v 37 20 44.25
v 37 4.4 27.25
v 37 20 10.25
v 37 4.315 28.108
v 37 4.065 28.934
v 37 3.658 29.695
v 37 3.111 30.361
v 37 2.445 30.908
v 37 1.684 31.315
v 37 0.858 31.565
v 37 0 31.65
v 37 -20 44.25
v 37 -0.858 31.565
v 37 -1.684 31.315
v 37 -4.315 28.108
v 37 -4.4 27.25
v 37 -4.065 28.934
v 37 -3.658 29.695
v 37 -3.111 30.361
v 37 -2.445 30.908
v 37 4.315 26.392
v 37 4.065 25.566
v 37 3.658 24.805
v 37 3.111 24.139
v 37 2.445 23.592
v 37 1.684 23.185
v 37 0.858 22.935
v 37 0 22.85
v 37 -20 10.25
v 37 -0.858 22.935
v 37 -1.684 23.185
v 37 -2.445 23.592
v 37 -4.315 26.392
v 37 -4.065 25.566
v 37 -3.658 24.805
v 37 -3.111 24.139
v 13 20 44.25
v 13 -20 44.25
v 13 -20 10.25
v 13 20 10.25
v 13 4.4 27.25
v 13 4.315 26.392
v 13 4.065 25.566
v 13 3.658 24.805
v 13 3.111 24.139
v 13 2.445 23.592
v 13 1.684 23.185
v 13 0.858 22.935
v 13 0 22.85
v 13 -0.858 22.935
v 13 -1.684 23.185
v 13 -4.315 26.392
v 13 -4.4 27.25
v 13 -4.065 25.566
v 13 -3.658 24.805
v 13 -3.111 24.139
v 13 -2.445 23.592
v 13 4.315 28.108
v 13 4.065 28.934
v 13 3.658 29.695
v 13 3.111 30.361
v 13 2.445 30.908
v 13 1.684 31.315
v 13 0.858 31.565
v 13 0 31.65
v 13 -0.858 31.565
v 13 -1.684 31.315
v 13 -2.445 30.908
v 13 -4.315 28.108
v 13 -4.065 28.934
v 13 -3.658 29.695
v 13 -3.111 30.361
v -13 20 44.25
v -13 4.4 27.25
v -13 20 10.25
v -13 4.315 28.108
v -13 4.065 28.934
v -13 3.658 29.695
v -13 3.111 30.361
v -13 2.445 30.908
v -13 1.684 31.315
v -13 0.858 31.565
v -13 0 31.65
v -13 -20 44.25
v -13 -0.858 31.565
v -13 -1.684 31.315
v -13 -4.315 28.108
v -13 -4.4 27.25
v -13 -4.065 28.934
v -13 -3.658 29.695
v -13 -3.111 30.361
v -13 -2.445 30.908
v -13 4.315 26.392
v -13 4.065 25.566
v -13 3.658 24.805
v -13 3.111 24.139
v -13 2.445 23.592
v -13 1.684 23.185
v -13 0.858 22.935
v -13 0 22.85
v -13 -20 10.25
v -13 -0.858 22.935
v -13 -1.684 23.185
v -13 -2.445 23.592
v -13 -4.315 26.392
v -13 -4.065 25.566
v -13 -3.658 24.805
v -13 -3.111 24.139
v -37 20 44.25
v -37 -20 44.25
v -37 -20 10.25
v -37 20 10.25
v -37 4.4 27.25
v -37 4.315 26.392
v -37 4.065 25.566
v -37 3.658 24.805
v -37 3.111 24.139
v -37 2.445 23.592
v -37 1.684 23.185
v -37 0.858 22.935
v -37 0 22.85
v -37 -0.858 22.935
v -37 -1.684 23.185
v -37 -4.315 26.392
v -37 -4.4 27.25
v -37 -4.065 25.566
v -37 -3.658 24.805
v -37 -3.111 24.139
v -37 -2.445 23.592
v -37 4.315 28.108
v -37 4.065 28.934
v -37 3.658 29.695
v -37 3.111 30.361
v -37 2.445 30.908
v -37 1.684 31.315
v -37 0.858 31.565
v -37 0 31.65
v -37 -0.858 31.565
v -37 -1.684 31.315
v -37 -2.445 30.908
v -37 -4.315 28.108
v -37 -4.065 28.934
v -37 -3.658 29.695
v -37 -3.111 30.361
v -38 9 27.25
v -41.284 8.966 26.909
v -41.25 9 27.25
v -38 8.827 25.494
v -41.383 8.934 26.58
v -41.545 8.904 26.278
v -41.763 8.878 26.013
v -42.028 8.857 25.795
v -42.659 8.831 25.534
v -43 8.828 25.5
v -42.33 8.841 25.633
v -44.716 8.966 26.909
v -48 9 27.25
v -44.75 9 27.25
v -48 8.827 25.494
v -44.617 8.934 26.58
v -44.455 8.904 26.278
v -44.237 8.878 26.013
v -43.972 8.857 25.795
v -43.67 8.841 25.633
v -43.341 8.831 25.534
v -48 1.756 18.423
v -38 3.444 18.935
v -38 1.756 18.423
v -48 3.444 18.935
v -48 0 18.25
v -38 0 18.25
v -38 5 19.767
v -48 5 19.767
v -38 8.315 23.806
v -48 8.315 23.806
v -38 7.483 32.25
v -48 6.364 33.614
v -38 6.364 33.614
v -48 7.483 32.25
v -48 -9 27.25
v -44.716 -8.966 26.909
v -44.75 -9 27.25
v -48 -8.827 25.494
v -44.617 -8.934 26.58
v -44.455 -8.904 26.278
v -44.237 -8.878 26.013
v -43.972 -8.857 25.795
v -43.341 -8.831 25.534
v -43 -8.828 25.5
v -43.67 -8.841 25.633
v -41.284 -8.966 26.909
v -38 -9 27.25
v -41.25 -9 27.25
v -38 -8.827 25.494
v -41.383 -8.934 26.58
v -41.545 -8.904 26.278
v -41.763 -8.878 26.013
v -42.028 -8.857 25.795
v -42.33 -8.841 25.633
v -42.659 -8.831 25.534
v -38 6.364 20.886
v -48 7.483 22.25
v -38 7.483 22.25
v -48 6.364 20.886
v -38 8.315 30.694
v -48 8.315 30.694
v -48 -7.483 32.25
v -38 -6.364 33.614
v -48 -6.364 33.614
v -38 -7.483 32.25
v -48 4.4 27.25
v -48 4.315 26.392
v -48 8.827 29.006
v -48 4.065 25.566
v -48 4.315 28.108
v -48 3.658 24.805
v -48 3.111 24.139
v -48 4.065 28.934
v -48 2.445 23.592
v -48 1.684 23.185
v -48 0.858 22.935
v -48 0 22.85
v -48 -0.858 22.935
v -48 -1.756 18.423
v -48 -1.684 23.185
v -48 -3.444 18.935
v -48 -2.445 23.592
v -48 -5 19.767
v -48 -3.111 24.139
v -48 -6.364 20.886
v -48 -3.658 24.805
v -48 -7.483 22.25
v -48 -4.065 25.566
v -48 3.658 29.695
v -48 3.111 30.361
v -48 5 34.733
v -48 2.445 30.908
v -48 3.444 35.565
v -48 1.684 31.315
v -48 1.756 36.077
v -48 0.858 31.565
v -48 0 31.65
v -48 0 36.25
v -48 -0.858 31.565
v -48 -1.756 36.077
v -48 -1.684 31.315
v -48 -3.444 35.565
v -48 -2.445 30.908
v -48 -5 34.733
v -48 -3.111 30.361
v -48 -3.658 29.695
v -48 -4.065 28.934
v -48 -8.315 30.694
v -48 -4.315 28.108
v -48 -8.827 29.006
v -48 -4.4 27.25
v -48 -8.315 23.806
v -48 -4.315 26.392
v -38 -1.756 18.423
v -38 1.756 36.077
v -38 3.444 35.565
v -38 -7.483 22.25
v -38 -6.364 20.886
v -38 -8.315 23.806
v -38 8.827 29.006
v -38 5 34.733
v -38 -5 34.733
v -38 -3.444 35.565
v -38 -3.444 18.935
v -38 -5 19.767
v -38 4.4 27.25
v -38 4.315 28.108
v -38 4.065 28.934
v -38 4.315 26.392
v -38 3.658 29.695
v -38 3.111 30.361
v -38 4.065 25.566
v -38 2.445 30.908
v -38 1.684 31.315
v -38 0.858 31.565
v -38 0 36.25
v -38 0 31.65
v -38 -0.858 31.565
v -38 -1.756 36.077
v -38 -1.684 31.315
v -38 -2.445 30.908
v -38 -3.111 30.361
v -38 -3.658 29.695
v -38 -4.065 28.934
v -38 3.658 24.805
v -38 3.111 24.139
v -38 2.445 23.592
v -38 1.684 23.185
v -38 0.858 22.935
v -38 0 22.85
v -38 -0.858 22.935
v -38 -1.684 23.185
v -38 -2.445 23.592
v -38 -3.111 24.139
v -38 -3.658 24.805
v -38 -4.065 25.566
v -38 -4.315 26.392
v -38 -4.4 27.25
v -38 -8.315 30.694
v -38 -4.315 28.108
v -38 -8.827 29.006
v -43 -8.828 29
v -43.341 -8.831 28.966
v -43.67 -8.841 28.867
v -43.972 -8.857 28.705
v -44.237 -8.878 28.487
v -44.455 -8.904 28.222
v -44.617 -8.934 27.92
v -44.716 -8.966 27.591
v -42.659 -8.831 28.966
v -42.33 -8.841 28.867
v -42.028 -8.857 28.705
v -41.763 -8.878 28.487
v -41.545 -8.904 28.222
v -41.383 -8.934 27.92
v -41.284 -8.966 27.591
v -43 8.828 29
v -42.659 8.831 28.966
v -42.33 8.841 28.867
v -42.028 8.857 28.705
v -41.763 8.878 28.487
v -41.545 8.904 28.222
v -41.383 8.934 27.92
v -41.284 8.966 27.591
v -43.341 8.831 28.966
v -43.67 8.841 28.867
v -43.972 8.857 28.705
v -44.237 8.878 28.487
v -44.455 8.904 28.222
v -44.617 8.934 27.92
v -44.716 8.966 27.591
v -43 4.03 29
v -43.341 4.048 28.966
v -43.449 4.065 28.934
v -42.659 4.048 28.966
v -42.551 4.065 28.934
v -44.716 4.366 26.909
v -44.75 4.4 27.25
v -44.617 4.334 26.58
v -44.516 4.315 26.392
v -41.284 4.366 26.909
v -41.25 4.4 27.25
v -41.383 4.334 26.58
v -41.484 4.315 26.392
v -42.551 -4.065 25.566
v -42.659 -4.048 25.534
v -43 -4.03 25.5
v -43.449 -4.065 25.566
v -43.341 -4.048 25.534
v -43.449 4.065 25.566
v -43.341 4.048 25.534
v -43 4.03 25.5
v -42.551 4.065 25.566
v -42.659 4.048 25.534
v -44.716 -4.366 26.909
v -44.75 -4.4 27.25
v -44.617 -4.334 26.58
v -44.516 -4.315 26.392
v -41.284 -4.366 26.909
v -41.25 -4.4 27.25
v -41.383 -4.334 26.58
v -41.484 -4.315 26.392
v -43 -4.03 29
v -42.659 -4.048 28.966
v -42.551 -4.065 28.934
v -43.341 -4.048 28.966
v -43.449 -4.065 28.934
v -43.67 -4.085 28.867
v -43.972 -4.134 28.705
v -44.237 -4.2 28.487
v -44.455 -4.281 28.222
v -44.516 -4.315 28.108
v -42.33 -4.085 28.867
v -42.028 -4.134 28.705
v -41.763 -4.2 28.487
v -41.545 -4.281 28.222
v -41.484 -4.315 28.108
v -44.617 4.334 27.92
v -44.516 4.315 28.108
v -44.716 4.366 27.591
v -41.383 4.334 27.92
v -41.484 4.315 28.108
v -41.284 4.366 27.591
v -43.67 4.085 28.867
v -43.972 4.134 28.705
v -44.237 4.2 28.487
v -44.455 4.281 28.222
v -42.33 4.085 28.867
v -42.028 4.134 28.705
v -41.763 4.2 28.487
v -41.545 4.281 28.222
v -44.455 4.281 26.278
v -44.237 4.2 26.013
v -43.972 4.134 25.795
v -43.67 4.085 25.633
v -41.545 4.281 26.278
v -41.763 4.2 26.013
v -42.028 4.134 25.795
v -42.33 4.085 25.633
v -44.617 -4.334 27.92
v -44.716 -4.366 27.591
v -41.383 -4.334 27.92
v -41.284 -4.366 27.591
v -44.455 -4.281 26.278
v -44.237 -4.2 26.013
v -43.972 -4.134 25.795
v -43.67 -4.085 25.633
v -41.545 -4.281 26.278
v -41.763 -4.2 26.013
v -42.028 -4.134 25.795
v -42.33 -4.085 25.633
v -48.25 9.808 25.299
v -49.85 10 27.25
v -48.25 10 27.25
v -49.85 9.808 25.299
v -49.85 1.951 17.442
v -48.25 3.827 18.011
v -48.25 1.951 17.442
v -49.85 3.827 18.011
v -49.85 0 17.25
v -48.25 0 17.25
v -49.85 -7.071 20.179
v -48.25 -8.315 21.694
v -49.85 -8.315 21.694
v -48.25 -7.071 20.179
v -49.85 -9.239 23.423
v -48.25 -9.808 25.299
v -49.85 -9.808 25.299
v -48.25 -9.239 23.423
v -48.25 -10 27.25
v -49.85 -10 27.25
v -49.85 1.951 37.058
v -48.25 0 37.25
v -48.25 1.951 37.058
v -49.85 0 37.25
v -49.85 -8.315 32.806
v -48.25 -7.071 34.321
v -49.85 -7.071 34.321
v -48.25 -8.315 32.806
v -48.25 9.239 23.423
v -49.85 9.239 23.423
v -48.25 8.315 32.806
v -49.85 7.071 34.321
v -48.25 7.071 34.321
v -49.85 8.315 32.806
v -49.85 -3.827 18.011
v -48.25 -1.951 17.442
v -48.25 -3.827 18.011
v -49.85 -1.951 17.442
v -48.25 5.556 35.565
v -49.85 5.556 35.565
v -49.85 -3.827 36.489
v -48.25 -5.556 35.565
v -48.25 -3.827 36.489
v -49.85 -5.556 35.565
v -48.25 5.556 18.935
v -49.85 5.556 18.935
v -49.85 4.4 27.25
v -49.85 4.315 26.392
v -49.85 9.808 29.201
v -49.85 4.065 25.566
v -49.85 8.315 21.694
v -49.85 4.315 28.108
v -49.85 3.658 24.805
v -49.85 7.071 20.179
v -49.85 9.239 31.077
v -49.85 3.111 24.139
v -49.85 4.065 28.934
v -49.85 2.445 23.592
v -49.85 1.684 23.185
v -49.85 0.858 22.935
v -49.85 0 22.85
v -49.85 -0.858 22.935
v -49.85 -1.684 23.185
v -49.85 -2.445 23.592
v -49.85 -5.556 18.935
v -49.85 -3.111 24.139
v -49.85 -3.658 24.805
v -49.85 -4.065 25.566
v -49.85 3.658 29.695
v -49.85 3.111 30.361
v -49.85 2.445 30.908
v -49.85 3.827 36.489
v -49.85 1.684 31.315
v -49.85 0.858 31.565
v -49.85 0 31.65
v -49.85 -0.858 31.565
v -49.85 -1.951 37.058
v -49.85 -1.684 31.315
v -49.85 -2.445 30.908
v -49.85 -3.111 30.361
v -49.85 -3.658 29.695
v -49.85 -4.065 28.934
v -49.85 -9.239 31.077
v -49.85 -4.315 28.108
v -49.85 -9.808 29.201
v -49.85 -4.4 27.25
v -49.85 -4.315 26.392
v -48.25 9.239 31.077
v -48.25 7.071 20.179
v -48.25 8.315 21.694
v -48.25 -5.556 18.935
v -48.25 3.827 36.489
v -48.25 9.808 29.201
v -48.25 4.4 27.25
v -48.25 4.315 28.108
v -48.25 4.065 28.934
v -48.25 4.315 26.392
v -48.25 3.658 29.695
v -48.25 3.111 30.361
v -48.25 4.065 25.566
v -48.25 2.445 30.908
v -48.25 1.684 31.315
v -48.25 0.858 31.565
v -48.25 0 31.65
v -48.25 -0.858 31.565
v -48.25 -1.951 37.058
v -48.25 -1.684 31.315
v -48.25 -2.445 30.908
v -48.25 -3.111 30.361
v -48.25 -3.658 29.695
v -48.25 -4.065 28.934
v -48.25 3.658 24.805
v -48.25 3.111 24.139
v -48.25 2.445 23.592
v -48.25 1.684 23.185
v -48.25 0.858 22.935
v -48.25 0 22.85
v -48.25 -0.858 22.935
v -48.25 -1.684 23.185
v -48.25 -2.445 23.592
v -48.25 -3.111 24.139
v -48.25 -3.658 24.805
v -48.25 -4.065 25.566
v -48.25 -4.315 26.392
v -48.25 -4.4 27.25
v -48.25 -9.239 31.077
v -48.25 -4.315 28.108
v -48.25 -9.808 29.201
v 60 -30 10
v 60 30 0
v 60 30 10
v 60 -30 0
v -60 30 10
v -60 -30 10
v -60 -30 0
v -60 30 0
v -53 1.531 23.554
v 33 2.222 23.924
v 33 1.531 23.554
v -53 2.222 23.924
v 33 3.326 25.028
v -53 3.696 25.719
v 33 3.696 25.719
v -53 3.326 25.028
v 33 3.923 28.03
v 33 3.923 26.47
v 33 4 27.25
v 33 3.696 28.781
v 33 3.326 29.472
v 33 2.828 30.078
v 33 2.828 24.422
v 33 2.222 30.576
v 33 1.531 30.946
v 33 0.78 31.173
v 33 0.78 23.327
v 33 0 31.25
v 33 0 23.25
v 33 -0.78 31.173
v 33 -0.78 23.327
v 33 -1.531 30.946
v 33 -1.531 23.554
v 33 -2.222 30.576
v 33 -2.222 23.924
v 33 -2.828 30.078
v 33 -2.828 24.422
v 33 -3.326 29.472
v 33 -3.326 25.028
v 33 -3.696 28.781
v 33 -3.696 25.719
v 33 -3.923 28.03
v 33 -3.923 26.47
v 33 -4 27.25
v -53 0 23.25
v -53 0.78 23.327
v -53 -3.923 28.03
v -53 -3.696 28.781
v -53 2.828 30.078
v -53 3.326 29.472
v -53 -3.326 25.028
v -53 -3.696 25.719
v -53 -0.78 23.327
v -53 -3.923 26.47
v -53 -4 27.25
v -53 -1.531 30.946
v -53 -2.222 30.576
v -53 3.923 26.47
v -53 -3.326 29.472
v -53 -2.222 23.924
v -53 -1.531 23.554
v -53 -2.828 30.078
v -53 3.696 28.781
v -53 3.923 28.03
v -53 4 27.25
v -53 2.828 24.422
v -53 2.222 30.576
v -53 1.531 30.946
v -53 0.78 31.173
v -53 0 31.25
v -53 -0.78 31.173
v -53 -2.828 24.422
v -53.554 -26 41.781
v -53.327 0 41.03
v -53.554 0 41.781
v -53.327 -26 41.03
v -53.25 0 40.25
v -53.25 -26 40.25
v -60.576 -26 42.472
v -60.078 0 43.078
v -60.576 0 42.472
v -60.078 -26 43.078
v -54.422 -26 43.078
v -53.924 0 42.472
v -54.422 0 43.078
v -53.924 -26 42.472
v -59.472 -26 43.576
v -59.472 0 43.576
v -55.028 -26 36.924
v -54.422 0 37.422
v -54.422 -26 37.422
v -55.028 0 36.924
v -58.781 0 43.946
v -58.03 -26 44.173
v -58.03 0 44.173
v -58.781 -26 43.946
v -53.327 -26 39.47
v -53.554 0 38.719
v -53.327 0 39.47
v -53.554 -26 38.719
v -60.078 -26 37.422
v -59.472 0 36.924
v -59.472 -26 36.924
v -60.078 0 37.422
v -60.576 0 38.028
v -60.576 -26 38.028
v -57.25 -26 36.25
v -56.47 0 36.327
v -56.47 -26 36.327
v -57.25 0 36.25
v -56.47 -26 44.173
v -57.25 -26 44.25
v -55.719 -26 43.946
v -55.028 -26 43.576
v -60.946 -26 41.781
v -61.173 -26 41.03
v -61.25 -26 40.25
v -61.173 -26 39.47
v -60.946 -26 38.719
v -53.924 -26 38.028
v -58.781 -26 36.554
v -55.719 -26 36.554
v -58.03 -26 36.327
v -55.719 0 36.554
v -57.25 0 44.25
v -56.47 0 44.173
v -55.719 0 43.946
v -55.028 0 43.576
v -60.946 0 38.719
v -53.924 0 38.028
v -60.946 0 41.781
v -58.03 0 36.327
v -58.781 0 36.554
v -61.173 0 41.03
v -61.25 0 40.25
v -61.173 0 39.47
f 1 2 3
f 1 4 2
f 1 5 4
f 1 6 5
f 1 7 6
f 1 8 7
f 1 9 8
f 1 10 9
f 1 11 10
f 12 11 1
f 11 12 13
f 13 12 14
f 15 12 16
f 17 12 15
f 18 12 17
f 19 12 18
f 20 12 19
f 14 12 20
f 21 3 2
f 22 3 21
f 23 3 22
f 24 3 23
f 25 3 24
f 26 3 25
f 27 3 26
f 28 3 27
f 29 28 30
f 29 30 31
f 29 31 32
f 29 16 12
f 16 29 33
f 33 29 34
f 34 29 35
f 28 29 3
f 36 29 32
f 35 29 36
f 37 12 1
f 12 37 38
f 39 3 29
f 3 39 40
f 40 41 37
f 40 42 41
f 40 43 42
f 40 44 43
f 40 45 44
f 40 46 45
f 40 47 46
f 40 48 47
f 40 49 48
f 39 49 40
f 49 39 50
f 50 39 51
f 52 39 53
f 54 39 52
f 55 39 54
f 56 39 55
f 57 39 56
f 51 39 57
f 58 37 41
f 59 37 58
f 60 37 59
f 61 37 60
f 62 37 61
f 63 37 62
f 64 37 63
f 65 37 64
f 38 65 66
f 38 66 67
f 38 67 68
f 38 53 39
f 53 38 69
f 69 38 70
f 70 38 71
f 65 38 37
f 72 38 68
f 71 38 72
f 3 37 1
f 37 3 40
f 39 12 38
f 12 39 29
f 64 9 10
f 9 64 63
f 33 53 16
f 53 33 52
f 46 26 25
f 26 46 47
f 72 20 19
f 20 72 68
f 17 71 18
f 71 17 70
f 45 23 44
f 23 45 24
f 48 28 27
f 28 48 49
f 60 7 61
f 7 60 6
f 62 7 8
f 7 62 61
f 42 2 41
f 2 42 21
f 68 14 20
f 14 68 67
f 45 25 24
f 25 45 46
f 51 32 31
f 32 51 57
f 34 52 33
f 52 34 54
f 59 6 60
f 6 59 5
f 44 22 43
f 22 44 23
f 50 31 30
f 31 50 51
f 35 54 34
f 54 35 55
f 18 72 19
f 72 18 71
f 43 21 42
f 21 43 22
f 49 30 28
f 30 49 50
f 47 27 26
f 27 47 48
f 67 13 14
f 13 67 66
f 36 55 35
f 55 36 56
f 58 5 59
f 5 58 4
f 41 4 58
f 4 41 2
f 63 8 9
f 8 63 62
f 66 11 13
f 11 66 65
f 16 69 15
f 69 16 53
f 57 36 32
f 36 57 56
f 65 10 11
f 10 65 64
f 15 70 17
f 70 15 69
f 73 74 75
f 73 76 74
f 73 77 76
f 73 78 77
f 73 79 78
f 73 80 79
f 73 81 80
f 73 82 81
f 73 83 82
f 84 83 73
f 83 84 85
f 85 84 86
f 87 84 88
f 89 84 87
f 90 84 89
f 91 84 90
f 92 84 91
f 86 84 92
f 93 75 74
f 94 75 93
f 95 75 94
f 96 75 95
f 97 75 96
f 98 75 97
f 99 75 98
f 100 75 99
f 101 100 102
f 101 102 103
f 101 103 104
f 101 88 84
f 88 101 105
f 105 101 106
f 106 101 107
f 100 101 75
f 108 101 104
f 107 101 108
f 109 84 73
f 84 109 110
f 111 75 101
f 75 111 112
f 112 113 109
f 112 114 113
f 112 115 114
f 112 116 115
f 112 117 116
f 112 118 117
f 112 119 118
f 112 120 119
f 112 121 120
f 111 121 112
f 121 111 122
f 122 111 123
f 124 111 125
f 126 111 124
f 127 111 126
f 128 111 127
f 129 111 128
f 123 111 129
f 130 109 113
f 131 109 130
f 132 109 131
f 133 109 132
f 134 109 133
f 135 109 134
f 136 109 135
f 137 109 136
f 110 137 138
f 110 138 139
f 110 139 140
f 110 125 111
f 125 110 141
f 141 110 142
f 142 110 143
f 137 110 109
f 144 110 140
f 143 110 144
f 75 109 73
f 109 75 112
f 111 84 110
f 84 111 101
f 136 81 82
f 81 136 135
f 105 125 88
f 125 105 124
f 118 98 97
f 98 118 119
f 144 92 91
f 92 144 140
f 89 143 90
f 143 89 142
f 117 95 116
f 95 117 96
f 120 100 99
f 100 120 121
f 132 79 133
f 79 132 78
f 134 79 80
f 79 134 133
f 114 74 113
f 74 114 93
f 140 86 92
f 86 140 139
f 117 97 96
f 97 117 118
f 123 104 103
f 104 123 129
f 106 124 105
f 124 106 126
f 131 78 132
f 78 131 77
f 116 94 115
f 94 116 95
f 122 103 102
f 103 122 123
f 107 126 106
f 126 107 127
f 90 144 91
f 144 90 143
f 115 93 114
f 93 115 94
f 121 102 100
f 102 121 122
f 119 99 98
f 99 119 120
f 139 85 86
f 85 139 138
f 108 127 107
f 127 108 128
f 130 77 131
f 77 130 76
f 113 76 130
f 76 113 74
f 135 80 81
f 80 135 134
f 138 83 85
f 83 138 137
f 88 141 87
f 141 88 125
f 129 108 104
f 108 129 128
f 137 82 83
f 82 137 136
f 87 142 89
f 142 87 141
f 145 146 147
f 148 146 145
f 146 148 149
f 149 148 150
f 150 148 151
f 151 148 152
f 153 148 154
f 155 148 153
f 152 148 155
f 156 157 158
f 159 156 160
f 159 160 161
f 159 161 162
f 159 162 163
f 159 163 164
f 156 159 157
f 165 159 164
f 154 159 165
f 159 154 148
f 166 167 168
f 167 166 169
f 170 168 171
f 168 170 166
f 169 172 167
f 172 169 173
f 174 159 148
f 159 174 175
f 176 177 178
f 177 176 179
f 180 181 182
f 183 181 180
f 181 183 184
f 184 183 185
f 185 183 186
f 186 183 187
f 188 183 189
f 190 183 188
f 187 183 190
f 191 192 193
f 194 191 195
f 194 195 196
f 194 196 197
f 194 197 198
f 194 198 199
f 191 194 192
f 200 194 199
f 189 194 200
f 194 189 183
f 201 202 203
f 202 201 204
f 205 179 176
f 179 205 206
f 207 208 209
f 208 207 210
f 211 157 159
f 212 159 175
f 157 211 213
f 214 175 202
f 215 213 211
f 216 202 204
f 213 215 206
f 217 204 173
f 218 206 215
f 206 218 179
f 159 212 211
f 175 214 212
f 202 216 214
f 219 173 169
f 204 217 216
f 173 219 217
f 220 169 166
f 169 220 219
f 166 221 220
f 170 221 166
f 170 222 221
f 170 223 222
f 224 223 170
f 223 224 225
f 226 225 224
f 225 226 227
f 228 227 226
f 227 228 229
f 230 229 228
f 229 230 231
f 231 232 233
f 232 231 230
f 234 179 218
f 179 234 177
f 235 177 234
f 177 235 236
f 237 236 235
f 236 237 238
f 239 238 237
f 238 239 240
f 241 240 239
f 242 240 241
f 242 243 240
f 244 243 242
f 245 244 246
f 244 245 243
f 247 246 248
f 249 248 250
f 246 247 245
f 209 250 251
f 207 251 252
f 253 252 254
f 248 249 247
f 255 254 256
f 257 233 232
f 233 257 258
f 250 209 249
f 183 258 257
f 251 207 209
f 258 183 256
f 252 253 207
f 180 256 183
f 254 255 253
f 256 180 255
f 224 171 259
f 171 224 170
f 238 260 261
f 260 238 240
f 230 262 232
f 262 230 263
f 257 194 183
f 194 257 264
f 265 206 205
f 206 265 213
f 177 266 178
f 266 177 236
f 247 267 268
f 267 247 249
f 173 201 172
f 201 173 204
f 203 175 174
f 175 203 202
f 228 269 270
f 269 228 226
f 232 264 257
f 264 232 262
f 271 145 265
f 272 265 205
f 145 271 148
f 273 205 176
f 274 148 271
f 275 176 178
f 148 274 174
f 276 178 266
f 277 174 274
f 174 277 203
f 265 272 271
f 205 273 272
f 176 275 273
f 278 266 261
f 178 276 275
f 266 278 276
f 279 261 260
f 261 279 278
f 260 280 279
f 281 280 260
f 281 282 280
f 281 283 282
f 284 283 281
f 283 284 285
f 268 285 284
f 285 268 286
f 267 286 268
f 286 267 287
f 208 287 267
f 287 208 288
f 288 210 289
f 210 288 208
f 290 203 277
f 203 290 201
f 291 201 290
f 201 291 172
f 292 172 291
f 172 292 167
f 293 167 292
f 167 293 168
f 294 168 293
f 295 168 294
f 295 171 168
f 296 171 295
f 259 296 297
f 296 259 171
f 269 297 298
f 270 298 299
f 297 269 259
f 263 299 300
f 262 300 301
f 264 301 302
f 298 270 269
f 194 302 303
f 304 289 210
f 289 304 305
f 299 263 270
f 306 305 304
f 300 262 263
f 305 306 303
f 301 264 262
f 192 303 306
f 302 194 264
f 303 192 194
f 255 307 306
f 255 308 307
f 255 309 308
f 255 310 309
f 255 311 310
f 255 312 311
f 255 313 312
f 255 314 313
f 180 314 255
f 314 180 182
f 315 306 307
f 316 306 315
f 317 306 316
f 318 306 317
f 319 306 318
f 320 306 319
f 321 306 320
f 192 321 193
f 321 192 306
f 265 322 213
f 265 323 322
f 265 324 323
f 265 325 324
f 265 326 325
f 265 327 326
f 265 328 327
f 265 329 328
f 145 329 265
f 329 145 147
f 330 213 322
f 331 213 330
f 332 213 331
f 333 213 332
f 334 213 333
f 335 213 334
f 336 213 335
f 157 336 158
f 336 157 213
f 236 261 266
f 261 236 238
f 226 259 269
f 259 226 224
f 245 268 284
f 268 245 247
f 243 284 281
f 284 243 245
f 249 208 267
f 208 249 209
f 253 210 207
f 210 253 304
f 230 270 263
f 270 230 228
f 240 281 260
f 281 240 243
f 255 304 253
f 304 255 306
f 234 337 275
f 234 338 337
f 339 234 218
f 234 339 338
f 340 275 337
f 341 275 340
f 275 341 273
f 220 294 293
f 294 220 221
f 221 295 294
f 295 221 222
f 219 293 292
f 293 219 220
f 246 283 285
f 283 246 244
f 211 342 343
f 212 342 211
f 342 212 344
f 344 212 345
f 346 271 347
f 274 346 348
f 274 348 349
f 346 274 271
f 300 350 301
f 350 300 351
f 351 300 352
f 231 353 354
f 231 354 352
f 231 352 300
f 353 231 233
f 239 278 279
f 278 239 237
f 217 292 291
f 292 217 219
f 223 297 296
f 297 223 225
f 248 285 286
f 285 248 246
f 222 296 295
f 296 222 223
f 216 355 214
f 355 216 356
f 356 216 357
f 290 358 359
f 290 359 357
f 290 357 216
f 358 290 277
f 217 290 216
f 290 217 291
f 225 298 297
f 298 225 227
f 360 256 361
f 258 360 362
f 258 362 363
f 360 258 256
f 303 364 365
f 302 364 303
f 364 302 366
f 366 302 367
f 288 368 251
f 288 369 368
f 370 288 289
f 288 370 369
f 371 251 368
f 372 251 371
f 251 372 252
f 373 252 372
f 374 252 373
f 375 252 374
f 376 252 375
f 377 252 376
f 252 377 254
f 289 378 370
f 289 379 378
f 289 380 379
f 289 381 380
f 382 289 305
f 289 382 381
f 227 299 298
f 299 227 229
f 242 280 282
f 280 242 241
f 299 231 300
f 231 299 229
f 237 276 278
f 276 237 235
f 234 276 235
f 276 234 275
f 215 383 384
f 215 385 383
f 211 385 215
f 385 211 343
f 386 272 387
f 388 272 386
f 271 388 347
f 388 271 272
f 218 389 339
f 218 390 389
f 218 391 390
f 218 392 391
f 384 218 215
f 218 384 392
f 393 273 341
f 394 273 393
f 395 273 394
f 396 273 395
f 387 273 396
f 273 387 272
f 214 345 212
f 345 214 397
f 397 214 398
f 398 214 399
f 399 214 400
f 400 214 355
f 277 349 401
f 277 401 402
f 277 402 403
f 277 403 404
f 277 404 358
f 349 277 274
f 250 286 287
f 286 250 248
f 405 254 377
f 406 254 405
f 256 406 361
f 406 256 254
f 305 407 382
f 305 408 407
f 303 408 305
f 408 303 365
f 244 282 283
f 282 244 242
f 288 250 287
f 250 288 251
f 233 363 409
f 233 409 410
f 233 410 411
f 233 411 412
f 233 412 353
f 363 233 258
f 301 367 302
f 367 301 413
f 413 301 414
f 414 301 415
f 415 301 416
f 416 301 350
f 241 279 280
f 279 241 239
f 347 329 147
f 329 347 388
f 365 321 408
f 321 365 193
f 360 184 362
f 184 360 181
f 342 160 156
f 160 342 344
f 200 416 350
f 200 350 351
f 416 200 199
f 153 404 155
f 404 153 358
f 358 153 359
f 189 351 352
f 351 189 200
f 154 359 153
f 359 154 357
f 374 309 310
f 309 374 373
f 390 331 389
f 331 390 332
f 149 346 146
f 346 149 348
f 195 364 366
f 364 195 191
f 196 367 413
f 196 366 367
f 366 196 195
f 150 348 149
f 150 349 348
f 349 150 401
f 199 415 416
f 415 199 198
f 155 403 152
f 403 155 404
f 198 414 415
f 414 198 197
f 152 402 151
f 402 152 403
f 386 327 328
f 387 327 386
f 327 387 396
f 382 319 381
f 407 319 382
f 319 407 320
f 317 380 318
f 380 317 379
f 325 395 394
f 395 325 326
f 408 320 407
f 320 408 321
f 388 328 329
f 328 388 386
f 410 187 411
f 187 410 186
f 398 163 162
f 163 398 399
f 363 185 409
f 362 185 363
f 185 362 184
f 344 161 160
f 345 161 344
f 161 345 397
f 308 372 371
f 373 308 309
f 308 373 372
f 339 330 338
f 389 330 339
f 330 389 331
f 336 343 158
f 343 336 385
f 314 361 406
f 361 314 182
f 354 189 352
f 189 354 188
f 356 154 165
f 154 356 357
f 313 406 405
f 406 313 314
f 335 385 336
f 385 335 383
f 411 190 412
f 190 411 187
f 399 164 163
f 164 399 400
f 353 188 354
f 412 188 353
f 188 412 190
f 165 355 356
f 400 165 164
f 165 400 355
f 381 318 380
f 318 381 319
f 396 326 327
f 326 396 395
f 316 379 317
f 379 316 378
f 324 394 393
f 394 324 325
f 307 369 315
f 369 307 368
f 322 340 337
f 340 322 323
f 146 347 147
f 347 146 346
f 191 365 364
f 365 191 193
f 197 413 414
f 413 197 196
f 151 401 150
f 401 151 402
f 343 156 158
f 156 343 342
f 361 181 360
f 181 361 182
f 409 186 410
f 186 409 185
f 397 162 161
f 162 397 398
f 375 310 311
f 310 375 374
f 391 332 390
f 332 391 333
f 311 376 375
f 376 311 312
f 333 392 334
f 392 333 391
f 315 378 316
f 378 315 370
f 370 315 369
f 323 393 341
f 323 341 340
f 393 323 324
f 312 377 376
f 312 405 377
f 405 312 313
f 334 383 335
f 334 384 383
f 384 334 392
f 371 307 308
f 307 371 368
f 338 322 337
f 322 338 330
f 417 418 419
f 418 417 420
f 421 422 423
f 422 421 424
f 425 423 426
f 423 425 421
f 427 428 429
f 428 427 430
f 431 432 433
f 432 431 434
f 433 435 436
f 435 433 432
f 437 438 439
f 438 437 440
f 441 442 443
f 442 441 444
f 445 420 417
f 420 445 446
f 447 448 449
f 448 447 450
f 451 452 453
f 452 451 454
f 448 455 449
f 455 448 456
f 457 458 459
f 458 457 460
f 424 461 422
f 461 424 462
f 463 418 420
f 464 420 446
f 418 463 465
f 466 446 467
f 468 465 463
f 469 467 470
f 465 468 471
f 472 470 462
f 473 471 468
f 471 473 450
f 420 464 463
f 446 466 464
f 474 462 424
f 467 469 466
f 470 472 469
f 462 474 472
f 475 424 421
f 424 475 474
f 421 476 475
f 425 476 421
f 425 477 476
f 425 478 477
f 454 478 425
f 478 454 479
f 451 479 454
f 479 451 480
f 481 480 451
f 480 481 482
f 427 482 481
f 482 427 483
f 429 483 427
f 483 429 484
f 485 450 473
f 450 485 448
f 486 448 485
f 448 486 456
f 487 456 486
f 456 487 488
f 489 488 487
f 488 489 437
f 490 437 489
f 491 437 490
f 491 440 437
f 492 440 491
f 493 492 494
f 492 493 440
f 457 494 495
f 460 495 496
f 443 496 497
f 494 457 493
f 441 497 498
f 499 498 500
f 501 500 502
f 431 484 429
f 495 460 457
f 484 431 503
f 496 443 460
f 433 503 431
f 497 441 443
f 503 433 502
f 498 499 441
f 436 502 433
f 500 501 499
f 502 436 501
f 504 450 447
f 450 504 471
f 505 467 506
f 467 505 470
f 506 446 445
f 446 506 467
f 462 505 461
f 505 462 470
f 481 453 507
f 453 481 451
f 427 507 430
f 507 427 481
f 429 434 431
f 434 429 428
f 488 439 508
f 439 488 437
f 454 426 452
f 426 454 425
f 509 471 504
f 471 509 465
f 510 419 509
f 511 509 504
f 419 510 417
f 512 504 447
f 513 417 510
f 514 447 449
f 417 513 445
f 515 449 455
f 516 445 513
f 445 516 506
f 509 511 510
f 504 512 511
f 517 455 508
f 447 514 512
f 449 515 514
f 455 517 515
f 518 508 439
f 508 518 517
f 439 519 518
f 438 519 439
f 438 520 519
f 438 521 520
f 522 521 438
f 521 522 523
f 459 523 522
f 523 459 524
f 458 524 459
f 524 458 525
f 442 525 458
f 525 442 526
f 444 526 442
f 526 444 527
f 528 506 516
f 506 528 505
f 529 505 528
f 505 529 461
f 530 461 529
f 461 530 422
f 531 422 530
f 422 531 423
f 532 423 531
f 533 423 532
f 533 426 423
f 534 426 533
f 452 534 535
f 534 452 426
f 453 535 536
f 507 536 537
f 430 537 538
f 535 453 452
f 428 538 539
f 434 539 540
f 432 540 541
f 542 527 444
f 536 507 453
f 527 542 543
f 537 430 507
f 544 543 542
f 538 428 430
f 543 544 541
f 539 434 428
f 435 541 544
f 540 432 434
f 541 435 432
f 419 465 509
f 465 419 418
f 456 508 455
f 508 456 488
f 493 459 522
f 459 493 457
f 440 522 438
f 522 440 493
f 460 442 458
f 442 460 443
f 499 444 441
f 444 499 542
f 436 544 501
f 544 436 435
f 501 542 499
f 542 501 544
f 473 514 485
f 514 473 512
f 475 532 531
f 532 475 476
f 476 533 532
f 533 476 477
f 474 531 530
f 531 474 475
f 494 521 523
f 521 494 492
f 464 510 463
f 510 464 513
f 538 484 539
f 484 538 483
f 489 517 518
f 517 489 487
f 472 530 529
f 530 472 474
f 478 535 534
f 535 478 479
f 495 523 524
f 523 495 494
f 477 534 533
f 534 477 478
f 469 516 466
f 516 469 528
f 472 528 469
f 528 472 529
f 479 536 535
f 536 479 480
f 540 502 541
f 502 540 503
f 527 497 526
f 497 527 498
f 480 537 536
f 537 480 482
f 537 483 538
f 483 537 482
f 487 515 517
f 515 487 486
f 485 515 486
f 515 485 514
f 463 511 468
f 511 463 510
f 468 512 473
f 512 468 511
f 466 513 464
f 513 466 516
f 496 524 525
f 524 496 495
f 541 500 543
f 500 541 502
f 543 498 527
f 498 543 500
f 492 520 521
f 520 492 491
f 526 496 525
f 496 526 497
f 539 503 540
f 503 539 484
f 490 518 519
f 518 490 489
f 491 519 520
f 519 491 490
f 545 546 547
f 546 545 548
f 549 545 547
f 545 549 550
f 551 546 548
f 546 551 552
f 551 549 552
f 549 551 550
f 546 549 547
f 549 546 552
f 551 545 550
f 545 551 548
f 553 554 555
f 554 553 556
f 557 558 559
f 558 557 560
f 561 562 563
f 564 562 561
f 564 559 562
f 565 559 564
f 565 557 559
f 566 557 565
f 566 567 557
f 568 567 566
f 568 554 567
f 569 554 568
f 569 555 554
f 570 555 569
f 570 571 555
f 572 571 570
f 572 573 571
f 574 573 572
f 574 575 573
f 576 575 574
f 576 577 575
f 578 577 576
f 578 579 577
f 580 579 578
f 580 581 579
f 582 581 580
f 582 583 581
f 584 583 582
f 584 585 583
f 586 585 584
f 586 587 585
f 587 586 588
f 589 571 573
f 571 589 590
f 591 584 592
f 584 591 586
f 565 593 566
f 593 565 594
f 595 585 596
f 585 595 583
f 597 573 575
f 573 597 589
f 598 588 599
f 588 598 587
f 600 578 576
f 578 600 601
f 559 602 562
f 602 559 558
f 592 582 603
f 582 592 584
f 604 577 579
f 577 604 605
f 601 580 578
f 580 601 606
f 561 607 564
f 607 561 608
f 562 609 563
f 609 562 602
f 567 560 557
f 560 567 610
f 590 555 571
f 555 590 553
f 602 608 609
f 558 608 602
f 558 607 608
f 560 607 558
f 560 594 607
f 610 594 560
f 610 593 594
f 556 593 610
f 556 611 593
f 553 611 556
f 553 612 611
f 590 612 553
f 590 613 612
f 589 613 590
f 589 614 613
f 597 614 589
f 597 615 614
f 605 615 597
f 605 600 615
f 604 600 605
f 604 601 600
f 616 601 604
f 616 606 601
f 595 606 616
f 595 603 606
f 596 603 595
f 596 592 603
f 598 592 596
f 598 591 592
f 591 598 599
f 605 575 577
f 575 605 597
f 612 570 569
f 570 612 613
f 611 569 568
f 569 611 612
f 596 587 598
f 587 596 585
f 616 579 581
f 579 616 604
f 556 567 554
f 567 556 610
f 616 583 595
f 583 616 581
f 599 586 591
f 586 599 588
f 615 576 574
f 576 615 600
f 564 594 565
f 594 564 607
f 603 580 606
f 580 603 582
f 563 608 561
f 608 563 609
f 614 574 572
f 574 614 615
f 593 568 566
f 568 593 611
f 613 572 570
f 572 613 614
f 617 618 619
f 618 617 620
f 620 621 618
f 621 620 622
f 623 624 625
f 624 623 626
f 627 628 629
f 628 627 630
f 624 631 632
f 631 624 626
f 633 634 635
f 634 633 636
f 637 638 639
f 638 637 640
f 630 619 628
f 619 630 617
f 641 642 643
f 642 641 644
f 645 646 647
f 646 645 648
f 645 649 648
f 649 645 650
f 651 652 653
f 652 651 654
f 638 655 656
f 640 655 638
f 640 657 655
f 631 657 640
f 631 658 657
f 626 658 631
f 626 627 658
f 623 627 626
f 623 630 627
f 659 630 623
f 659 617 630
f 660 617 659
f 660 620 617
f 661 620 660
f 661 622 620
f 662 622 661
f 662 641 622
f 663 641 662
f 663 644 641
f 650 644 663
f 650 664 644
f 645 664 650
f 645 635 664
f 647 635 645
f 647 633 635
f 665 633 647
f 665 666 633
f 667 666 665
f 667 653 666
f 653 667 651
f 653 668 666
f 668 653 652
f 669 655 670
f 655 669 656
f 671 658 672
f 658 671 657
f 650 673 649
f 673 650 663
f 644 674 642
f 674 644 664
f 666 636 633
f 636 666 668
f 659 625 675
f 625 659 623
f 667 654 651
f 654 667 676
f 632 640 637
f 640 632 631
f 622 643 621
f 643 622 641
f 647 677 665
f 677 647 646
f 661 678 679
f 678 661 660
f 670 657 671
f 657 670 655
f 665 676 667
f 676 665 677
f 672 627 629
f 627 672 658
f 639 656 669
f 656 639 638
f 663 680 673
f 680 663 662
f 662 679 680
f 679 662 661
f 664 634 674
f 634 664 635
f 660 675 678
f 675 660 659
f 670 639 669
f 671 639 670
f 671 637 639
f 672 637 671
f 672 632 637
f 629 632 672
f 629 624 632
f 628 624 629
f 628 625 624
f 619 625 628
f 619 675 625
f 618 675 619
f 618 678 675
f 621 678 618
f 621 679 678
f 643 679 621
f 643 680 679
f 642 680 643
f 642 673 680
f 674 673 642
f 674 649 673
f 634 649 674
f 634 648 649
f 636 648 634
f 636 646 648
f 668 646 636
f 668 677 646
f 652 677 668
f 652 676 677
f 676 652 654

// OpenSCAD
$fn = 32;

// ------------------------------------------------------------------------
// Machine vise: screw d8, jaws 24 x 34 mm
// Every part is its own module, assembly() places every instance.
// ------------------------------------------------------------------------

// --- part 1 ---
module vise_bed() {
  difference() {
    translate([-60, -30, 0]) cube([120, 60, 10]);
  }
}

// --- part 2 ---
module vise_jaw() {
  difference() {
    translate([-12, -20, 0]) cube([24, 40, 34]);
    translate([0, 0, 17]) rotate([0, 90, 0]) cylinder(h = 26, d = 8.8, center = true);
  }
}

// --- part 3 ---
module vise_screw() {
  translate([0, 0, -43]) cylinder(h = 86, d = 8);
}

// --- part 4 ---
module screw_collar() {
  difference() {
    cylinder(h = 10, d = 18);
    translate([0, 0, -1]) cylinder(h = 12, d = 8.8);
    translate([0, 0, 5]) rotate([90, 0, 0]) cylinder(h = 20, d = 3.5, center = true);
  }
}

// --- part 5 ---
module screw_washer() {
  difference() {
      translate([0, 0, 0]) cylinder(h = 1.6, d = 20);
      translate([0, 0, -1]) cylinder(h = 3.6, d = 8.8);
    }
}

// --- part 6 ---
module vise_handle() {
  cylinder(h = 26, d = 8);
}

// --- assembly ---
module assembly() {
  color([0.80, 0.24, 0.20]) translate([0, 0, 0]) rotate([0, 0, 0]) vise_bed();
  color([0.20, 0.45, 0.75]) translate([25, 0, 10.25]) rotate([0, 0, 0]) vise_jaw();
  color([0.25, 0.62, 0.32]) translate([-25, 0, 10.25]) rotate([0, 0, 0]) vise_jaw();
  color([0.92, 0.70, 0.18]) translate([-10, 0, 27.25]) rotate([0, 90, 0]) vise_screw();
  color([0.58, 0.35, 0.70]) translate([-48, 0, 27.25]) rotate([0, 90, 0]) screw_collar();
  color([0.16, 0.66, 0.66]) translate([-49.85, 0, 27.25]) rotate([0, 90, 0]) screw_washer();
  color([0.85, 0.48, 0.18]) translate([-57.25, 0, 40.25]) rotate([90, 0, 0]) vise_handle();
}

assembly();
